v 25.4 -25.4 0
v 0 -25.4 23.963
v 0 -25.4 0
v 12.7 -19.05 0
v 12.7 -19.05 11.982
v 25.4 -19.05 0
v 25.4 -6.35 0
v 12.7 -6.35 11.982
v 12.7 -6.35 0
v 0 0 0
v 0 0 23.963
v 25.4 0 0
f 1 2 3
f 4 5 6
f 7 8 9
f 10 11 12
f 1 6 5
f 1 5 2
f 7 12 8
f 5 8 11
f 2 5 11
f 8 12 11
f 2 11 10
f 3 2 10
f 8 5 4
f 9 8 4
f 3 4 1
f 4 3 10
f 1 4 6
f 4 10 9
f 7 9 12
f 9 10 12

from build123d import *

# Parameters (mm, degrees)
F1_DEPTH = 25.4
F3_START = -6.35
F3_DEPTH = 12.7


with BuildPart() as f1:
    # F0 (on Front) → F1 (new body)
    with BuildSketch(Plane.XZ):
        Polygon((0, 23.9633341665), (0, 0), (25.4, 0), align=None)
    extrude(amount=F1_DEPTH)

    # F2 (on face) → F3 (cut)
    with BuildSketch(Plane.XZ.offset(25.4).offset(F3_START)):
        Polygon((25.4, 0), (12.7, 11.9816670832), (12.7, 0), align=None)
    extrude(amount=-F3_DEPTH, mode=Mode.SUBTRACT)


solid = f1.part
